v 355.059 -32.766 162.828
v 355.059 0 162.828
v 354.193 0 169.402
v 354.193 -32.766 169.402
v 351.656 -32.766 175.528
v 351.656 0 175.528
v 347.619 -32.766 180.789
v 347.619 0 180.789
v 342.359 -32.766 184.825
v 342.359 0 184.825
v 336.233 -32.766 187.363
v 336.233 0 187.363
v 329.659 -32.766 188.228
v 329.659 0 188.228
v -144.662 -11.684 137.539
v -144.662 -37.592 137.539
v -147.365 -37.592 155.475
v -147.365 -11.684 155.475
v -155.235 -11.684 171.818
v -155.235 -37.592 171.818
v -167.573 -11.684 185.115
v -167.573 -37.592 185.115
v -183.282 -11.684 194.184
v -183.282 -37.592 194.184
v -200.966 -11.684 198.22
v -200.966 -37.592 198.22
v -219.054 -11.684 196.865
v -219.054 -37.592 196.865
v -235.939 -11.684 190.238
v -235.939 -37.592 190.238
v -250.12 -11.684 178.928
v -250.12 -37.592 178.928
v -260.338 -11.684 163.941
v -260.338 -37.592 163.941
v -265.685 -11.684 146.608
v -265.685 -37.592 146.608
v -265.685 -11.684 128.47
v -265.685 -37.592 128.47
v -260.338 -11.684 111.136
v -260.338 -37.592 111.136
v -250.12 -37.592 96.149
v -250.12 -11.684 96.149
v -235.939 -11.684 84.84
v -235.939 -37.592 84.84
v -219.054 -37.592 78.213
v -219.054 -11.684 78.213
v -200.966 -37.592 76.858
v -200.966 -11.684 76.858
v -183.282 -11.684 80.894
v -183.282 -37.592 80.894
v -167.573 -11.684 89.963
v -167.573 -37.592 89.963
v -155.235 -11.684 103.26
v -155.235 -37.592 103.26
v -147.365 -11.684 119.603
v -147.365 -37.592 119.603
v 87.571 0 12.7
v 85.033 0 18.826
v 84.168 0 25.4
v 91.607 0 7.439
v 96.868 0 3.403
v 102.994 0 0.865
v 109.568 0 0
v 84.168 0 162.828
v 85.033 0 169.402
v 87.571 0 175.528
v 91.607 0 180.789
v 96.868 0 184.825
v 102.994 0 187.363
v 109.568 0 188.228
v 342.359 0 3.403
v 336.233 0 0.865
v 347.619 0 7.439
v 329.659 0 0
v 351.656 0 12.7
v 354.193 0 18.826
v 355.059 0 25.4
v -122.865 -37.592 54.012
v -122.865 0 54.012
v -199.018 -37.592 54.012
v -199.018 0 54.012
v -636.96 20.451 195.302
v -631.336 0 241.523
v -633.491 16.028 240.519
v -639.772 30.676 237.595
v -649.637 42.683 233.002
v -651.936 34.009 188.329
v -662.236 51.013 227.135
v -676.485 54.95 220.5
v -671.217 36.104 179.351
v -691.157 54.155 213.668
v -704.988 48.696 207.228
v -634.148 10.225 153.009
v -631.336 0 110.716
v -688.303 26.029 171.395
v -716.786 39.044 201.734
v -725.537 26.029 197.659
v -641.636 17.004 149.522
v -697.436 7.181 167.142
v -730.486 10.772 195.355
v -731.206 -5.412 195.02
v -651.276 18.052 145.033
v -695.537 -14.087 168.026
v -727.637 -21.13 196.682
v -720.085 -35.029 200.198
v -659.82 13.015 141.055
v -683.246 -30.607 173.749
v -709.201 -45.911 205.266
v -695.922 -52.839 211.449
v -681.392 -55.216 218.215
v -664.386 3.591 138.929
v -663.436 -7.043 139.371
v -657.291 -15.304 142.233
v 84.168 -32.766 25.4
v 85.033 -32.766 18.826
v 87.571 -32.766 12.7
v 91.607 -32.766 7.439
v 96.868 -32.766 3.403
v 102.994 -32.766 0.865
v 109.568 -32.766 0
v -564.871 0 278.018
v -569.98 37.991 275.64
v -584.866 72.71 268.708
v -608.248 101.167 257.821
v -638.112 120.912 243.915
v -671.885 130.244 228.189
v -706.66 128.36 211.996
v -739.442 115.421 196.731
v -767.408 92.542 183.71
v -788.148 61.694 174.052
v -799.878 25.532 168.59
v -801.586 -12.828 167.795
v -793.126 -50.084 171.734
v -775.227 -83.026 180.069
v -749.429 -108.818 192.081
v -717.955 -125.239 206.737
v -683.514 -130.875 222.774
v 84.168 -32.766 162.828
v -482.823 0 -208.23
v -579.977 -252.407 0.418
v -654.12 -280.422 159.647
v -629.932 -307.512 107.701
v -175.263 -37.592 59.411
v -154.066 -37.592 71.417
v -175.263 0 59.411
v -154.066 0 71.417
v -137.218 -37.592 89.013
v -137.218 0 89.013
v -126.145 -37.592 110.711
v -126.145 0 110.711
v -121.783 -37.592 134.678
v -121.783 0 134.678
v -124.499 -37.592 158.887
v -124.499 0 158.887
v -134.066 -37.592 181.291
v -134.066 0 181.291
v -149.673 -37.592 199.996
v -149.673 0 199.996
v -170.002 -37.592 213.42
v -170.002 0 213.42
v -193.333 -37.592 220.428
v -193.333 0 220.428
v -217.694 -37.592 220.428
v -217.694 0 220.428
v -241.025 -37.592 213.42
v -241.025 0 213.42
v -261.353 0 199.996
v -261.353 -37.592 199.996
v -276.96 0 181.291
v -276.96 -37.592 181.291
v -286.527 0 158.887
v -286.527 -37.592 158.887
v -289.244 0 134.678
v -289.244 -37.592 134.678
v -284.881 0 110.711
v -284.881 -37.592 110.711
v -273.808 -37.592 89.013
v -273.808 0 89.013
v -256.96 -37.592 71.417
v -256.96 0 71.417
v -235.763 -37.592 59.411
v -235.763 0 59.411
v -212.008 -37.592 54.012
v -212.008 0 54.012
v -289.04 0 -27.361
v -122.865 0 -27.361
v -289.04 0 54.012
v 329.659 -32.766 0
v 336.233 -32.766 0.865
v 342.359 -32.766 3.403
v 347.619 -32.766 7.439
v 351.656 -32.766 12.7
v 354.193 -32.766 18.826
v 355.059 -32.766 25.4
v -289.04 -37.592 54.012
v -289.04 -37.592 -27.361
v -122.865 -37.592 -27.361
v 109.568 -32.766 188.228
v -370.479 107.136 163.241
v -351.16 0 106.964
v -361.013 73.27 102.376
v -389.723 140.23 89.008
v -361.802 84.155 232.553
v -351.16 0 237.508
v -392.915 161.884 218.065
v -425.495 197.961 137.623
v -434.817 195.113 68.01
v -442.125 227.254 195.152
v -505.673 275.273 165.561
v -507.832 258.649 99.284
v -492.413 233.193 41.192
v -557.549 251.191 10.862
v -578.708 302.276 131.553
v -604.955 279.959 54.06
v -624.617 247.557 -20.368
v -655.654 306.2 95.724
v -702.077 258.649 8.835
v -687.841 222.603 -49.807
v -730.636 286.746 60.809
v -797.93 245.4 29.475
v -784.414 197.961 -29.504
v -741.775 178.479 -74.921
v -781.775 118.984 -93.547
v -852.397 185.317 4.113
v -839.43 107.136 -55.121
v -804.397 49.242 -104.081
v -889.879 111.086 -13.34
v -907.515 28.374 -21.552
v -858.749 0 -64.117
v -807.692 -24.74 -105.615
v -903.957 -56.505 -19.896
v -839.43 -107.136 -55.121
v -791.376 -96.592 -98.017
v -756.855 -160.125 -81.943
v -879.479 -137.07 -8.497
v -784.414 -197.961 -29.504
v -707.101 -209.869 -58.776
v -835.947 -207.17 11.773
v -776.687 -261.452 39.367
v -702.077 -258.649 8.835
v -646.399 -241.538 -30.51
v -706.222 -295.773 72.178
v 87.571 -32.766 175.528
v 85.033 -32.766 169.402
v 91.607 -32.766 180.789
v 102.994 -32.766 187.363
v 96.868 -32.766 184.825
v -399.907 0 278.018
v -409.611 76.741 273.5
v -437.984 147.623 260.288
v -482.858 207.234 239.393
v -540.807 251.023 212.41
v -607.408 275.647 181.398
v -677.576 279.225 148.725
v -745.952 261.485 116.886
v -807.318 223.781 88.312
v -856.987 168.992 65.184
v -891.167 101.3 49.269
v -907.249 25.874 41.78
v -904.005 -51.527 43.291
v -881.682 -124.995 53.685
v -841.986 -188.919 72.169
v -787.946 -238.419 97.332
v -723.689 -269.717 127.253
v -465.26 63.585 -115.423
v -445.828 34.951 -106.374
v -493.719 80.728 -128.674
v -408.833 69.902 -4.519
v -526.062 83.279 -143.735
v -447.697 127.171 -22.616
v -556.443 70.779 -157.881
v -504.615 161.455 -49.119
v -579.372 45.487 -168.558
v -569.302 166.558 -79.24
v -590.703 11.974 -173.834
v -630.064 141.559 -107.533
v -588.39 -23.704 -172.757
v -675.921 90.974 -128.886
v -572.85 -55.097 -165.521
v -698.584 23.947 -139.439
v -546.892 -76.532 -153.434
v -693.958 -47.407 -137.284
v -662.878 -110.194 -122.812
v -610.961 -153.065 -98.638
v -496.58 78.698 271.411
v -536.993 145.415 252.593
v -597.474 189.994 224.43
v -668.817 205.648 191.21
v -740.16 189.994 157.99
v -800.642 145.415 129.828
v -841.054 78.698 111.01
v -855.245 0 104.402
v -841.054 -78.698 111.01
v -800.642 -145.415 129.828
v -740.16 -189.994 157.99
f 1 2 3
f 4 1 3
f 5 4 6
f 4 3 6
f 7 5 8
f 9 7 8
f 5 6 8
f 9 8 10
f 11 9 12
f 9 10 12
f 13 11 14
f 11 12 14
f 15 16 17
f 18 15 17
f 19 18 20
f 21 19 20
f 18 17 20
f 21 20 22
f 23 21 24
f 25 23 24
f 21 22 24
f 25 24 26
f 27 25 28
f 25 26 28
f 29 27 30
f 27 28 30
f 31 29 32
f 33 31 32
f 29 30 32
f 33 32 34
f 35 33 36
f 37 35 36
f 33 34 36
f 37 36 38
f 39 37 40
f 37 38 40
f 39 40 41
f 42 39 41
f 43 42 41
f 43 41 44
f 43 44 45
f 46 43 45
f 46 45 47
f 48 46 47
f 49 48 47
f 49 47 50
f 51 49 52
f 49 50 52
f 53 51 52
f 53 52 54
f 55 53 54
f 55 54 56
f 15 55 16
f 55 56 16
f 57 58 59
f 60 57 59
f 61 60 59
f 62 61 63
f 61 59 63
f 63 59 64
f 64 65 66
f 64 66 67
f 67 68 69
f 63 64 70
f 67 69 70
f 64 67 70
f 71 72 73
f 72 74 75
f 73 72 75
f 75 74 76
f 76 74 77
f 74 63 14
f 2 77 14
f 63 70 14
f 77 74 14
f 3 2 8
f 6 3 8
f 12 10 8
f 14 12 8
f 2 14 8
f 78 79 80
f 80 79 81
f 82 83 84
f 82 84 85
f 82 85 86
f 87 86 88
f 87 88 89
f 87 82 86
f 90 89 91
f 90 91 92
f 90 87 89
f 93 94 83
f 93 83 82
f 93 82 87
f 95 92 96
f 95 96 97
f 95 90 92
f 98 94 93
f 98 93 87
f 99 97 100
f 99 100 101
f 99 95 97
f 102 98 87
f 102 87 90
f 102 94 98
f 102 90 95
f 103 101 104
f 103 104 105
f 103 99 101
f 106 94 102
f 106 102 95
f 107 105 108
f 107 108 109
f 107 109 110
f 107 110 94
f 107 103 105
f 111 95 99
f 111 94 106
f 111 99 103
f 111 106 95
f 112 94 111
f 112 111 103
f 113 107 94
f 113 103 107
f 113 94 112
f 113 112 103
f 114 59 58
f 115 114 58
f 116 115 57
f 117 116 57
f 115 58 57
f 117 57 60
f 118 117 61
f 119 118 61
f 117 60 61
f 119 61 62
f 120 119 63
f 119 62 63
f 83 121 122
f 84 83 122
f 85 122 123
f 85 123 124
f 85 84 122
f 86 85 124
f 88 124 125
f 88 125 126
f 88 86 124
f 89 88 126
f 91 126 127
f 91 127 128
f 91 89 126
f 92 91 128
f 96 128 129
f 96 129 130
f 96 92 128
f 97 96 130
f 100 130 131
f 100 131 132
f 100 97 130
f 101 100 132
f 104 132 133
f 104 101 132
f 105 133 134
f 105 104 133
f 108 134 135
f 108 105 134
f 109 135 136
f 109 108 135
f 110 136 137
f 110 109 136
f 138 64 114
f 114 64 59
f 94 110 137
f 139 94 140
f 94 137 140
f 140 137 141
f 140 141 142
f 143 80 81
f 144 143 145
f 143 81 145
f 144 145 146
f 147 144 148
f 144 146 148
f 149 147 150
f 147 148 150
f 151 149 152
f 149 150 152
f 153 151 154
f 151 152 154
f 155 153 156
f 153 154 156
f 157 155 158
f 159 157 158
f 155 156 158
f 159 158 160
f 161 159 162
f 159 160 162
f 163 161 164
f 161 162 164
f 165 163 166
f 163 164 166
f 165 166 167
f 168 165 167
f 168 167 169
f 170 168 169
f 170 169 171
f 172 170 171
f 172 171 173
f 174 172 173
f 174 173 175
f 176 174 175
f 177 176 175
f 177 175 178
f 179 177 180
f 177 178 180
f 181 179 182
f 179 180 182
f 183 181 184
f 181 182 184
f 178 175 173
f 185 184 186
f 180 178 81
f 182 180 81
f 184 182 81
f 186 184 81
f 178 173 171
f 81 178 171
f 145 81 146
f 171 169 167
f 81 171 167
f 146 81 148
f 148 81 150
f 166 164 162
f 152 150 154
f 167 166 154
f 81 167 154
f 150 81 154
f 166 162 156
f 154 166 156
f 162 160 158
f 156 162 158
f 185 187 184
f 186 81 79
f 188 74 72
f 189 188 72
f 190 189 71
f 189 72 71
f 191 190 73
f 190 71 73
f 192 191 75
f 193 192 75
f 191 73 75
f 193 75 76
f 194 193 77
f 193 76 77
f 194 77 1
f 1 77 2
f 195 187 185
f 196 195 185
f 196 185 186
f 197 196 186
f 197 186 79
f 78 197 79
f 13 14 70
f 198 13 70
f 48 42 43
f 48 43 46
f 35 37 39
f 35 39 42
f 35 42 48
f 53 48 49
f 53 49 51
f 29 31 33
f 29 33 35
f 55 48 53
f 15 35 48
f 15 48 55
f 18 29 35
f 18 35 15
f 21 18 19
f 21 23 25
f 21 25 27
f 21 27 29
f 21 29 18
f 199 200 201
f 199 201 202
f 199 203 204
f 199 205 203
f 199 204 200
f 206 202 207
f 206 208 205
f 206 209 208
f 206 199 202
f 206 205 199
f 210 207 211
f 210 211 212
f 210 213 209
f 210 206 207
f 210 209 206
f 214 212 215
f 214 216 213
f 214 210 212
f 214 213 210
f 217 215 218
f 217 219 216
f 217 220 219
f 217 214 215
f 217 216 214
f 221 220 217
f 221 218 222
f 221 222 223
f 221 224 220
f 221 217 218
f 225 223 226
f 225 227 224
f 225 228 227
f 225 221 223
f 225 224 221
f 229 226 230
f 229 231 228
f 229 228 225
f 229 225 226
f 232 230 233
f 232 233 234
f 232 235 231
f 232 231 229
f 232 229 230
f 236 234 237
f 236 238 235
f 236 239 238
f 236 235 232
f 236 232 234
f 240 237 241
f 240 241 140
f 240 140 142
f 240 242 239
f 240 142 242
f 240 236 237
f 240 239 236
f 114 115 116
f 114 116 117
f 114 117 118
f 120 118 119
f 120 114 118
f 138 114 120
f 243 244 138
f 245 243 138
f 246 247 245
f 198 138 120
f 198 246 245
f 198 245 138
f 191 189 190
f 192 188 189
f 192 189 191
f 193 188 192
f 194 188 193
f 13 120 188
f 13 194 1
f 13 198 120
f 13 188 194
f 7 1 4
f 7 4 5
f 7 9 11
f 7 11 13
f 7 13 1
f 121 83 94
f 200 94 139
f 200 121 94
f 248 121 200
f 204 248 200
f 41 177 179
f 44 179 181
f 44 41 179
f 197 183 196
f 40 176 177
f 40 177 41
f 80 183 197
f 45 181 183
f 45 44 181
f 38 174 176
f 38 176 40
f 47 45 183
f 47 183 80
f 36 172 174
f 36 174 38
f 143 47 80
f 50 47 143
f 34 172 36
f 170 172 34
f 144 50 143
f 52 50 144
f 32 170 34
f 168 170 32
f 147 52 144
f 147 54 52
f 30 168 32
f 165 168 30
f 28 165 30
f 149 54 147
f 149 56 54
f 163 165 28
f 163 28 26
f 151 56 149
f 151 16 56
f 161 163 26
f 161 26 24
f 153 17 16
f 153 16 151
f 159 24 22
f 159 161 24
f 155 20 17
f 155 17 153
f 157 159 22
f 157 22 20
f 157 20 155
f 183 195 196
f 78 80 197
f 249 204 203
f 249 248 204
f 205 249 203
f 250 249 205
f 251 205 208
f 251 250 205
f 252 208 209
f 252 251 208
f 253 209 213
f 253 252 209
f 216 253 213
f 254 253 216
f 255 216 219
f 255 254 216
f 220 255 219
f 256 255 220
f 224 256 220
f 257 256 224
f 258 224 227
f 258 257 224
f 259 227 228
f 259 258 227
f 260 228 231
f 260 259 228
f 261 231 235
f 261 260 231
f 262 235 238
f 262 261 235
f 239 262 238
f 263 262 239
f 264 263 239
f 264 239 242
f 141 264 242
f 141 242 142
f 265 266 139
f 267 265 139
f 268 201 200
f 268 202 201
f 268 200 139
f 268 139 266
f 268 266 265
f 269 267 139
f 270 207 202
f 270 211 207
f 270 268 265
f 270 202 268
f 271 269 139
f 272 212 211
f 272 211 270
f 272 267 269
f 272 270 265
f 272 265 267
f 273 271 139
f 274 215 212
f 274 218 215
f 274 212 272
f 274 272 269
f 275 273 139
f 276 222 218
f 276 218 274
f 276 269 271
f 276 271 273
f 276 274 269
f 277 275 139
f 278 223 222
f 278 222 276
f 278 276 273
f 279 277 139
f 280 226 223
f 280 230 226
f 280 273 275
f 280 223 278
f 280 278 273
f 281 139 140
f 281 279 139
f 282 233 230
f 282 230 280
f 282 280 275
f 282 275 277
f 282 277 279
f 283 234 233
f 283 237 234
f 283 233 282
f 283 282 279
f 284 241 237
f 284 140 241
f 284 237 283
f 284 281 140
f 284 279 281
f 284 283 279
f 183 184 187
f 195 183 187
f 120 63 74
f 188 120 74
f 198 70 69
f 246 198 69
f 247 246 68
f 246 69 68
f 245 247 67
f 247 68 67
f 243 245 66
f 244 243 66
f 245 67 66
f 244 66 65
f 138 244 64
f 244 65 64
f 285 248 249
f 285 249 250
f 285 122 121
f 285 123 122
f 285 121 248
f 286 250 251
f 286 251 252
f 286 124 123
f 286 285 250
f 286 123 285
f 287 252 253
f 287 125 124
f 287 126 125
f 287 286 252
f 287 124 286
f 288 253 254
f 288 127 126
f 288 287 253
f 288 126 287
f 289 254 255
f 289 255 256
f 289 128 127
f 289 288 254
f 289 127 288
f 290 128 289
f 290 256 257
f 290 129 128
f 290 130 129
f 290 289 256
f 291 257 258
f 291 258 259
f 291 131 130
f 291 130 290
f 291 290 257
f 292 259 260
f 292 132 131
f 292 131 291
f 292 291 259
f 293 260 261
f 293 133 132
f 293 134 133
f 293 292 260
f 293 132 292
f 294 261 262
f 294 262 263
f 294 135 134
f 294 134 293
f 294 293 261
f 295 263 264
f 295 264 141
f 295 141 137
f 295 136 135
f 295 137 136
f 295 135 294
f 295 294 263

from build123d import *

# Parameters (mm, degrees)
F1_DEPTH = 37.592
F2_R     = 60.8514861747
F3_DEPTH = 25.908
F5_DEPTH = 32.766
F7_ANGLE = 270


with BuildPart() as f1:
    # F0 (on Front) → F1 (new body)
    with BuildSketch(Plane.XZ):
        with BuildLine():
            ThreePointArc((-121.7336990495, 137.5389695168), (-262.4113939912, 199.0333841631), (-212.0080255497, 54.0117397904))
            Line((-212.0080255497, 54.0117397904), (-205.5130675435, 54.0117397904))
            Line((-205.5130675435, 54.0117397904), (-199.0181095374, 54.0117397904))
            ThreePointArc((-199.0181095374, 54.0117397904), (-144.0186528971, 80.640643069), (-121.7336990495, 137.5389695168))
        make_face()
        with BuildLine():
            ThreePointArc((-121.9858378172, 137.5389695168), (-146.4503969903, 78.4762989635), (-205.5130675435, 54.0117397904))
            ThreePointArc((-205.5130675435, 54.0117397904), (-264.5757380967, 196.60164007), (-121.9858378172, 137.5389695168))
        make_face(mode=Mode.SUBTRACT)
        with BuildLine():
            ThreePointArc((-121.9858378172, 137.5389695168), (-264.5757380967, 196.60164007), (-205.5130675435, 54.0117397904))
            ThreePointArc((-205.5130675435, 54.0117397904), (-146.4503969903, 78.4762989635), (-121.9858378172, 137.5389695168))
        make_face()
        with BuildLine():
            Line((-212.0080255497, 54.0117397904), (-289.0402972698, 54.0117397904))
            Line((-289.0402972698, 54.0117397904), (-289.0402972698, -27.3608770221))
            Line((-289.0402972698, -27.3608770221), (-122.8653863072, -27.3608770221))
            Line((-122.8653863072, -27.3608770221), (-122.8653863072, 54.0117397904))
            Line((-122.8653863072, 54.0117397904), (-199.0181095374, 54.0117397904))
            ThreePointArc((-199.0181095374, 54.0117397904), (-205.5130675435, 53.7596010227), (-212.0080255497, 54.0117397904))
        make_face()
        with BuildLine():
            Line((-205.5130675435, 54.0117397904), (-212.0080255497, 54.0117397904))
            ThreePointArc((-212.0080255497, 54.0117397904), (-205.5130675435, 53.7596010227), (-199.0181095374, 54.0117397904))
            Line((-199.0181095374, 54.0117397904), (-205.5130675435, 54.0117397904))
        make_face()
    extrude(amount=F1_DEPTH)

    # F2 (on face) → F3 (cut)
    with BuildSketch(Plane.XZ.offset(37.592)):
        with Locations((-205.5130675435, 137.5389695168)):
            Circle(F2_R)
    extrude(amount=-F3_DEPTH, mode=Mode.SUBTRACT)


with BuildPart() as f5:
    # F4 (on Front) → F5 (new body)
    with BuildSketch(Plane.XZ):
        with BuildLine():
            Line((329.6588488579, 188.2283219576), (109.5676816344, 188.2283219576))
            ThreePointArc((109.5676816344, 188.2283219576), (91.6071693923, 180.7888341997), (84.1676816344, 162.8283219576))
            Line((84.1676816344, 162.8283219576), (84.1676816344, 25.4))
            ThreePointArc((84.1676816344, 25.4), (91.6071693923, 7.4394877579), (109.5676816344, 0))
            Line((109.5676816344, 0), (329.6588488579, 0))
            ThreePointArc((329.6588488579, 0), (347.6193611, 7.4394877579), (355.0588488579, 25.4))
            Line((355.0588488579, 25.4), (355.0588488579, 162.8283219576))
            ThreePointArc((355.0588488579, 162.8283219576), (347.6193611, 180.7888341997), (329.6588488579, 188.2283219576))
        make_face()
    extrude(amount=F5_DEPTH)


with BuildPart() as f7:
    # F6 (on Front) → F7 (revolve)
    with BuildSketch(Plane.XZ):
        Polygon((-631.3360333443, 241.5230721235), (-631.3360333443, 110.7161492109), (-482.8225632304, -208.2295247785), (-351.1602282524, 106.964148581), (-351.1602282524, 237.5081926584), (-399.906784296, 278.0184149742), (-564.8713707924, 278.0184149742), align=None)
    revolve(axis=Axis((-557.0792982873, 0, -48.7566877838), (-0.4221201234, 0, 0.9065399061)), revolution_arc=F7_ANGLE)


solid = Compound([f1.part, f5.part, f7.part])
